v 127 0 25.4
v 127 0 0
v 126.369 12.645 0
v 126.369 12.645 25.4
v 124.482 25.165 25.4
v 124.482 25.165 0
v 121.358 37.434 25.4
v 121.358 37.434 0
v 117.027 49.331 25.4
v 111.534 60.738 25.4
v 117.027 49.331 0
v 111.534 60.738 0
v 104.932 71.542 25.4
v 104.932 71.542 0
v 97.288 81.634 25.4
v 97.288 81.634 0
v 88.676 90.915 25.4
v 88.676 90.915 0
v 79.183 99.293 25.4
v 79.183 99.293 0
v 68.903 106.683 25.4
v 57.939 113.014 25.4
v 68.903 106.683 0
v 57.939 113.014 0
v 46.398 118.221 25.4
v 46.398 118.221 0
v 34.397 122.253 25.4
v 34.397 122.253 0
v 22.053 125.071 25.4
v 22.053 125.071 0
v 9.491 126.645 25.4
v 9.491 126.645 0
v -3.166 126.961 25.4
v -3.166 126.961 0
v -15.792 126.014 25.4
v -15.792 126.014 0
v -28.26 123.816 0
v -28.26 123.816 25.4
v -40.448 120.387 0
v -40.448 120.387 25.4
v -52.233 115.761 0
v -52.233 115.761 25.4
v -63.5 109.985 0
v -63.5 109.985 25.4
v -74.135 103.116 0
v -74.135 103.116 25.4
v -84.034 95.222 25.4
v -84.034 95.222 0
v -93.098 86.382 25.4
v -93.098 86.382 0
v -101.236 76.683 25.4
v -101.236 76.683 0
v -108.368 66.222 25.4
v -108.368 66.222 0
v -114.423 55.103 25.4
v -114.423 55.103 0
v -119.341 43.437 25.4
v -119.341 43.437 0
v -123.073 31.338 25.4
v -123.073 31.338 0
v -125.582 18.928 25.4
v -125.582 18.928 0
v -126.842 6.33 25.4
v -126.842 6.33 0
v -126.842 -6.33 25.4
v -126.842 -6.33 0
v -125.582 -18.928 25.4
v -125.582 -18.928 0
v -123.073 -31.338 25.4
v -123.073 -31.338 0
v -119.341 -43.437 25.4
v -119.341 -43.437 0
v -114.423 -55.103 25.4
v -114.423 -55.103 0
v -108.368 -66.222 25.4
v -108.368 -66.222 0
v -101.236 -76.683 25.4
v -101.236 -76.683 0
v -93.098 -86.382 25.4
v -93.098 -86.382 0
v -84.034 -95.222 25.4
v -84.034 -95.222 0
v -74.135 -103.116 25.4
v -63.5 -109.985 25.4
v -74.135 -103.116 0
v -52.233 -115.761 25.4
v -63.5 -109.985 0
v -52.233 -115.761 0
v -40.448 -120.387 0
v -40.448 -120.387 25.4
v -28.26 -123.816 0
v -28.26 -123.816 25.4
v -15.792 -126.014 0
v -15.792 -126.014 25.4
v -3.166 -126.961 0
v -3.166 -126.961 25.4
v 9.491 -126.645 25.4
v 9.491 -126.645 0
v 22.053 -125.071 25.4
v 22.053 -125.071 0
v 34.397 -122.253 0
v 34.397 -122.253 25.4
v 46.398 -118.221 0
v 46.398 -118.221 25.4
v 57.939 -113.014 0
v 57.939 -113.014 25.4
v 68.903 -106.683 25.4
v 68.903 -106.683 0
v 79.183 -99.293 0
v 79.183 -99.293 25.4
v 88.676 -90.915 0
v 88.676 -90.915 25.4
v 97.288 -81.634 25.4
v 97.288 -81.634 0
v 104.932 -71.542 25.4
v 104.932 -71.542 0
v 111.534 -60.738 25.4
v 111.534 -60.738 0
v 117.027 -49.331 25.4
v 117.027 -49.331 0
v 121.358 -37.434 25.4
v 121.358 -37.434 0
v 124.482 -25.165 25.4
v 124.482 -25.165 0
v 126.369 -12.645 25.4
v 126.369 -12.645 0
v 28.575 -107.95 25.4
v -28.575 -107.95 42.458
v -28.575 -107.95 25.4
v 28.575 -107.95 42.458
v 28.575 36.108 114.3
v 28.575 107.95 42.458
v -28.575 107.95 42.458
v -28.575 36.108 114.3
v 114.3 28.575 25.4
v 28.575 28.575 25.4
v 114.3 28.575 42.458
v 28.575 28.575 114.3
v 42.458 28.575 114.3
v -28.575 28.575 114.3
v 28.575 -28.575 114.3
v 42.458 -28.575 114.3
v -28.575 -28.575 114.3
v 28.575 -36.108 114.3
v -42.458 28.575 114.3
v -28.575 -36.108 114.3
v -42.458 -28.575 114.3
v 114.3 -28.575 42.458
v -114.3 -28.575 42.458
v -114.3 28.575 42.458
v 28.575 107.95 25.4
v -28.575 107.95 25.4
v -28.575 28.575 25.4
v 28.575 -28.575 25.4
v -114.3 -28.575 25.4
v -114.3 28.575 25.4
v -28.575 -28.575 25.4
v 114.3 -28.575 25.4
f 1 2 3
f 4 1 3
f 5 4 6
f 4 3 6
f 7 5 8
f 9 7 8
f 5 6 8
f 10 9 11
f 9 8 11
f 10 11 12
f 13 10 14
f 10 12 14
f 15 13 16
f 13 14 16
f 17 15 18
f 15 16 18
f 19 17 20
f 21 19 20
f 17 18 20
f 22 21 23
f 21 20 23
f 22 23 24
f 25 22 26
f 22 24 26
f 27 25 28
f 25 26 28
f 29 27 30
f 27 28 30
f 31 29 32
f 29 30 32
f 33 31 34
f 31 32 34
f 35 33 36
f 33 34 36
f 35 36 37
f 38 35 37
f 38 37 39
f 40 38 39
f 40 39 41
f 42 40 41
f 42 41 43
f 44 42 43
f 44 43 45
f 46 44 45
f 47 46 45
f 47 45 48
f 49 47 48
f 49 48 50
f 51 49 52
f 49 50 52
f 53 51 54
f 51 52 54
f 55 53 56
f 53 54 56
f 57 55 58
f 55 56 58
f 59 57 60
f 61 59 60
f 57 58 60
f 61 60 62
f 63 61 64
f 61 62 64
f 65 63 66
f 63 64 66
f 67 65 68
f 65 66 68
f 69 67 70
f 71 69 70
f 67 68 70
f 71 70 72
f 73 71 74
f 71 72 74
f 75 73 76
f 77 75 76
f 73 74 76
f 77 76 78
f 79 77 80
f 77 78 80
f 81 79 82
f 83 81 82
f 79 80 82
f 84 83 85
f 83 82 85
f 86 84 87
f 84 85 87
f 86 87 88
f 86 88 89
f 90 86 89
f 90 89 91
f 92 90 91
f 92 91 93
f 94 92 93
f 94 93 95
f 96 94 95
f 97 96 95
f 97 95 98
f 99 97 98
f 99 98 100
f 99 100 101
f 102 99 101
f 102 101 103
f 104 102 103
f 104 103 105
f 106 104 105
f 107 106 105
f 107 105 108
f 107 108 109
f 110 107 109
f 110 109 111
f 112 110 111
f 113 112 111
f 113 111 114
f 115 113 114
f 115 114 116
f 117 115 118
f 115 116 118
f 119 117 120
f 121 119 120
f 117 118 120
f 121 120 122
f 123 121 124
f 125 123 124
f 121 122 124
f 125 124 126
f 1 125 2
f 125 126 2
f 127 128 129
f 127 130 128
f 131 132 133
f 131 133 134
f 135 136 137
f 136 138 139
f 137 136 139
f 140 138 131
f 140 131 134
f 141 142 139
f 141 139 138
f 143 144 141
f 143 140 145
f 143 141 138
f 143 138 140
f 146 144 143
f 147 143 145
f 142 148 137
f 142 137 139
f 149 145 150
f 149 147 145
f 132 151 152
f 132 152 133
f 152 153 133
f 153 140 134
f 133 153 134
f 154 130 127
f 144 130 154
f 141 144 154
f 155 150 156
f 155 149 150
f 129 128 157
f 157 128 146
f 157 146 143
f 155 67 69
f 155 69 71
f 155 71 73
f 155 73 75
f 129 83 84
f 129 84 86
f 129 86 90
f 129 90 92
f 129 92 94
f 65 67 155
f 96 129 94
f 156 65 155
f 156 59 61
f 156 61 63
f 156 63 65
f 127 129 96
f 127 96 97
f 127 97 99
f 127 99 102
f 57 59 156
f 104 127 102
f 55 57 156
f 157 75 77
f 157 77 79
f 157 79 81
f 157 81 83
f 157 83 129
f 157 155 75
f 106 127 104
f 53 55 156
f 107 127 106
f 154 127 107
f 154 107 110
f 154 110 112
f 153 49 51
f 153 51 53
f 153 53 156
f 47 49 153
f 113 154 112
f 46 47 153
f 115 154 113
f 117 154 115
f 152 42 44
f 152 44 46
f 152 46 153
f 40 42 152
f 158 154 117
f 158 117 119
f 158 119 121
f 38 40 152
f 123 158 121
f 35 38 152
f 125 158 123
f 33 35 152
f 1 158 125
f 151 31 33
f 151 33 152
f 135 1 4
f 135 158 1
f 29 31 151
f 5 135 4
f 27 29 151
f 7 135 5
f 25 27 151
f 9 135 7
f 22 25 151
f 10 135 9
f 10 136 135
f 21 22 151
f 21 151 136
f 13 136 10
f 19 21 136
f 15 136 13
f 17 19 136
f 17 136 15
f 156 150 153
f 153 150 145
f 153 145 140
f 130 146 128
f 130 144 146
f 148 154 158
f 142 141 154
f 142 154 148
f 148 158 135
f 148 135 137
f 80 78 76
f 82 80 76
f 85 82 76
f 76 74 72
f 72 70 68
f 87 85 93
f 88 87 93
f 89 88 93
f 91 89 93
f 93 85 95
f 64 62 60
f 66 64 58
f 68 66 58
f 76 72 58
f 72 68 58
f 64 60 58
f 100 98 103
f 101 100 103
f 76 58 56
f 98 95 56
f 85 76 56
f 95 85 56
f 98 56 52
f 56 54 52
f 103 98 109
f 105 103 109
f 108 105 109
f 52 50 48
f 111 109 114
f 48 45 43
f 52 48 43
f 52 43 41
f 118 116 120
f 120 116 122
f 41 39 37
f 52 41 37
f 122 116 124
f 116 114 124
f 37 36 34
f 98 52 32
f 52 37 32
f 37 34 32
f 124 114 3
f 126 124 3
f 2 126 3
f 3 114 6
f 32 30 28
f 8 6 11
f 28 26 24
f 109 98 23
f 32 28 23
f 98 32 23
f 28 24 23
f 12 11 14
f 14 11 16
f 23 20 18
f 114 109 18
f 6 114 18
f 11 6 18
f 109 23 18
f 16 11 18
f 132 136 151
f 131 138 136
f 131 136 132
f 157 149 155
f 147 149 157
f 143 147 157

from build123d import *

# Parameters (mm, degrees)
F0_R     = 127
F1_DEPTH = 25.4
F3_DEPTH = 28.575
F5_DEPTH = 28.575


with BuildPart() as f1:
    # F0 (on Top) → F1 (new body)
    with BuildSketch(Plane.XY):
        Circle(F0_R)
    extrude(amount=F1_DEPTH)

    # F2 (on Right) → F3 (join, symmetric)
    with BuildSketch(Plane.YZ):
        Polygon((-107.95, 42.457951), (-107.95, 25.4), (0, 25.4), (0, 114.3), (-36.107951, 114.3), align=None)
        Polygon((0, 114.3), (0, 25.4), (107.95, 25.4), (107.95, 42.457951), (36.107951, 114.3), align=None)
    extrude(amount=F3_DEPTH, both=True)

    # F4 (on Front) → F5 (join, symmetric)
    with BuildSketch(Plane.XZ):
        Polygon((-114.3, 42.457951), (-114.3, 25.4), (0, 25.4), (0, 114.3), (-42.457951, 114.3), align=None)
        Polygon((0, 114.3), (0, 25.4), (114.3, 25.4), (114.3, 42.457951), (42.457951, 114.3), align=None)
    extrude(amount=F5_DEPTH, both=True)


solid = f1.part
